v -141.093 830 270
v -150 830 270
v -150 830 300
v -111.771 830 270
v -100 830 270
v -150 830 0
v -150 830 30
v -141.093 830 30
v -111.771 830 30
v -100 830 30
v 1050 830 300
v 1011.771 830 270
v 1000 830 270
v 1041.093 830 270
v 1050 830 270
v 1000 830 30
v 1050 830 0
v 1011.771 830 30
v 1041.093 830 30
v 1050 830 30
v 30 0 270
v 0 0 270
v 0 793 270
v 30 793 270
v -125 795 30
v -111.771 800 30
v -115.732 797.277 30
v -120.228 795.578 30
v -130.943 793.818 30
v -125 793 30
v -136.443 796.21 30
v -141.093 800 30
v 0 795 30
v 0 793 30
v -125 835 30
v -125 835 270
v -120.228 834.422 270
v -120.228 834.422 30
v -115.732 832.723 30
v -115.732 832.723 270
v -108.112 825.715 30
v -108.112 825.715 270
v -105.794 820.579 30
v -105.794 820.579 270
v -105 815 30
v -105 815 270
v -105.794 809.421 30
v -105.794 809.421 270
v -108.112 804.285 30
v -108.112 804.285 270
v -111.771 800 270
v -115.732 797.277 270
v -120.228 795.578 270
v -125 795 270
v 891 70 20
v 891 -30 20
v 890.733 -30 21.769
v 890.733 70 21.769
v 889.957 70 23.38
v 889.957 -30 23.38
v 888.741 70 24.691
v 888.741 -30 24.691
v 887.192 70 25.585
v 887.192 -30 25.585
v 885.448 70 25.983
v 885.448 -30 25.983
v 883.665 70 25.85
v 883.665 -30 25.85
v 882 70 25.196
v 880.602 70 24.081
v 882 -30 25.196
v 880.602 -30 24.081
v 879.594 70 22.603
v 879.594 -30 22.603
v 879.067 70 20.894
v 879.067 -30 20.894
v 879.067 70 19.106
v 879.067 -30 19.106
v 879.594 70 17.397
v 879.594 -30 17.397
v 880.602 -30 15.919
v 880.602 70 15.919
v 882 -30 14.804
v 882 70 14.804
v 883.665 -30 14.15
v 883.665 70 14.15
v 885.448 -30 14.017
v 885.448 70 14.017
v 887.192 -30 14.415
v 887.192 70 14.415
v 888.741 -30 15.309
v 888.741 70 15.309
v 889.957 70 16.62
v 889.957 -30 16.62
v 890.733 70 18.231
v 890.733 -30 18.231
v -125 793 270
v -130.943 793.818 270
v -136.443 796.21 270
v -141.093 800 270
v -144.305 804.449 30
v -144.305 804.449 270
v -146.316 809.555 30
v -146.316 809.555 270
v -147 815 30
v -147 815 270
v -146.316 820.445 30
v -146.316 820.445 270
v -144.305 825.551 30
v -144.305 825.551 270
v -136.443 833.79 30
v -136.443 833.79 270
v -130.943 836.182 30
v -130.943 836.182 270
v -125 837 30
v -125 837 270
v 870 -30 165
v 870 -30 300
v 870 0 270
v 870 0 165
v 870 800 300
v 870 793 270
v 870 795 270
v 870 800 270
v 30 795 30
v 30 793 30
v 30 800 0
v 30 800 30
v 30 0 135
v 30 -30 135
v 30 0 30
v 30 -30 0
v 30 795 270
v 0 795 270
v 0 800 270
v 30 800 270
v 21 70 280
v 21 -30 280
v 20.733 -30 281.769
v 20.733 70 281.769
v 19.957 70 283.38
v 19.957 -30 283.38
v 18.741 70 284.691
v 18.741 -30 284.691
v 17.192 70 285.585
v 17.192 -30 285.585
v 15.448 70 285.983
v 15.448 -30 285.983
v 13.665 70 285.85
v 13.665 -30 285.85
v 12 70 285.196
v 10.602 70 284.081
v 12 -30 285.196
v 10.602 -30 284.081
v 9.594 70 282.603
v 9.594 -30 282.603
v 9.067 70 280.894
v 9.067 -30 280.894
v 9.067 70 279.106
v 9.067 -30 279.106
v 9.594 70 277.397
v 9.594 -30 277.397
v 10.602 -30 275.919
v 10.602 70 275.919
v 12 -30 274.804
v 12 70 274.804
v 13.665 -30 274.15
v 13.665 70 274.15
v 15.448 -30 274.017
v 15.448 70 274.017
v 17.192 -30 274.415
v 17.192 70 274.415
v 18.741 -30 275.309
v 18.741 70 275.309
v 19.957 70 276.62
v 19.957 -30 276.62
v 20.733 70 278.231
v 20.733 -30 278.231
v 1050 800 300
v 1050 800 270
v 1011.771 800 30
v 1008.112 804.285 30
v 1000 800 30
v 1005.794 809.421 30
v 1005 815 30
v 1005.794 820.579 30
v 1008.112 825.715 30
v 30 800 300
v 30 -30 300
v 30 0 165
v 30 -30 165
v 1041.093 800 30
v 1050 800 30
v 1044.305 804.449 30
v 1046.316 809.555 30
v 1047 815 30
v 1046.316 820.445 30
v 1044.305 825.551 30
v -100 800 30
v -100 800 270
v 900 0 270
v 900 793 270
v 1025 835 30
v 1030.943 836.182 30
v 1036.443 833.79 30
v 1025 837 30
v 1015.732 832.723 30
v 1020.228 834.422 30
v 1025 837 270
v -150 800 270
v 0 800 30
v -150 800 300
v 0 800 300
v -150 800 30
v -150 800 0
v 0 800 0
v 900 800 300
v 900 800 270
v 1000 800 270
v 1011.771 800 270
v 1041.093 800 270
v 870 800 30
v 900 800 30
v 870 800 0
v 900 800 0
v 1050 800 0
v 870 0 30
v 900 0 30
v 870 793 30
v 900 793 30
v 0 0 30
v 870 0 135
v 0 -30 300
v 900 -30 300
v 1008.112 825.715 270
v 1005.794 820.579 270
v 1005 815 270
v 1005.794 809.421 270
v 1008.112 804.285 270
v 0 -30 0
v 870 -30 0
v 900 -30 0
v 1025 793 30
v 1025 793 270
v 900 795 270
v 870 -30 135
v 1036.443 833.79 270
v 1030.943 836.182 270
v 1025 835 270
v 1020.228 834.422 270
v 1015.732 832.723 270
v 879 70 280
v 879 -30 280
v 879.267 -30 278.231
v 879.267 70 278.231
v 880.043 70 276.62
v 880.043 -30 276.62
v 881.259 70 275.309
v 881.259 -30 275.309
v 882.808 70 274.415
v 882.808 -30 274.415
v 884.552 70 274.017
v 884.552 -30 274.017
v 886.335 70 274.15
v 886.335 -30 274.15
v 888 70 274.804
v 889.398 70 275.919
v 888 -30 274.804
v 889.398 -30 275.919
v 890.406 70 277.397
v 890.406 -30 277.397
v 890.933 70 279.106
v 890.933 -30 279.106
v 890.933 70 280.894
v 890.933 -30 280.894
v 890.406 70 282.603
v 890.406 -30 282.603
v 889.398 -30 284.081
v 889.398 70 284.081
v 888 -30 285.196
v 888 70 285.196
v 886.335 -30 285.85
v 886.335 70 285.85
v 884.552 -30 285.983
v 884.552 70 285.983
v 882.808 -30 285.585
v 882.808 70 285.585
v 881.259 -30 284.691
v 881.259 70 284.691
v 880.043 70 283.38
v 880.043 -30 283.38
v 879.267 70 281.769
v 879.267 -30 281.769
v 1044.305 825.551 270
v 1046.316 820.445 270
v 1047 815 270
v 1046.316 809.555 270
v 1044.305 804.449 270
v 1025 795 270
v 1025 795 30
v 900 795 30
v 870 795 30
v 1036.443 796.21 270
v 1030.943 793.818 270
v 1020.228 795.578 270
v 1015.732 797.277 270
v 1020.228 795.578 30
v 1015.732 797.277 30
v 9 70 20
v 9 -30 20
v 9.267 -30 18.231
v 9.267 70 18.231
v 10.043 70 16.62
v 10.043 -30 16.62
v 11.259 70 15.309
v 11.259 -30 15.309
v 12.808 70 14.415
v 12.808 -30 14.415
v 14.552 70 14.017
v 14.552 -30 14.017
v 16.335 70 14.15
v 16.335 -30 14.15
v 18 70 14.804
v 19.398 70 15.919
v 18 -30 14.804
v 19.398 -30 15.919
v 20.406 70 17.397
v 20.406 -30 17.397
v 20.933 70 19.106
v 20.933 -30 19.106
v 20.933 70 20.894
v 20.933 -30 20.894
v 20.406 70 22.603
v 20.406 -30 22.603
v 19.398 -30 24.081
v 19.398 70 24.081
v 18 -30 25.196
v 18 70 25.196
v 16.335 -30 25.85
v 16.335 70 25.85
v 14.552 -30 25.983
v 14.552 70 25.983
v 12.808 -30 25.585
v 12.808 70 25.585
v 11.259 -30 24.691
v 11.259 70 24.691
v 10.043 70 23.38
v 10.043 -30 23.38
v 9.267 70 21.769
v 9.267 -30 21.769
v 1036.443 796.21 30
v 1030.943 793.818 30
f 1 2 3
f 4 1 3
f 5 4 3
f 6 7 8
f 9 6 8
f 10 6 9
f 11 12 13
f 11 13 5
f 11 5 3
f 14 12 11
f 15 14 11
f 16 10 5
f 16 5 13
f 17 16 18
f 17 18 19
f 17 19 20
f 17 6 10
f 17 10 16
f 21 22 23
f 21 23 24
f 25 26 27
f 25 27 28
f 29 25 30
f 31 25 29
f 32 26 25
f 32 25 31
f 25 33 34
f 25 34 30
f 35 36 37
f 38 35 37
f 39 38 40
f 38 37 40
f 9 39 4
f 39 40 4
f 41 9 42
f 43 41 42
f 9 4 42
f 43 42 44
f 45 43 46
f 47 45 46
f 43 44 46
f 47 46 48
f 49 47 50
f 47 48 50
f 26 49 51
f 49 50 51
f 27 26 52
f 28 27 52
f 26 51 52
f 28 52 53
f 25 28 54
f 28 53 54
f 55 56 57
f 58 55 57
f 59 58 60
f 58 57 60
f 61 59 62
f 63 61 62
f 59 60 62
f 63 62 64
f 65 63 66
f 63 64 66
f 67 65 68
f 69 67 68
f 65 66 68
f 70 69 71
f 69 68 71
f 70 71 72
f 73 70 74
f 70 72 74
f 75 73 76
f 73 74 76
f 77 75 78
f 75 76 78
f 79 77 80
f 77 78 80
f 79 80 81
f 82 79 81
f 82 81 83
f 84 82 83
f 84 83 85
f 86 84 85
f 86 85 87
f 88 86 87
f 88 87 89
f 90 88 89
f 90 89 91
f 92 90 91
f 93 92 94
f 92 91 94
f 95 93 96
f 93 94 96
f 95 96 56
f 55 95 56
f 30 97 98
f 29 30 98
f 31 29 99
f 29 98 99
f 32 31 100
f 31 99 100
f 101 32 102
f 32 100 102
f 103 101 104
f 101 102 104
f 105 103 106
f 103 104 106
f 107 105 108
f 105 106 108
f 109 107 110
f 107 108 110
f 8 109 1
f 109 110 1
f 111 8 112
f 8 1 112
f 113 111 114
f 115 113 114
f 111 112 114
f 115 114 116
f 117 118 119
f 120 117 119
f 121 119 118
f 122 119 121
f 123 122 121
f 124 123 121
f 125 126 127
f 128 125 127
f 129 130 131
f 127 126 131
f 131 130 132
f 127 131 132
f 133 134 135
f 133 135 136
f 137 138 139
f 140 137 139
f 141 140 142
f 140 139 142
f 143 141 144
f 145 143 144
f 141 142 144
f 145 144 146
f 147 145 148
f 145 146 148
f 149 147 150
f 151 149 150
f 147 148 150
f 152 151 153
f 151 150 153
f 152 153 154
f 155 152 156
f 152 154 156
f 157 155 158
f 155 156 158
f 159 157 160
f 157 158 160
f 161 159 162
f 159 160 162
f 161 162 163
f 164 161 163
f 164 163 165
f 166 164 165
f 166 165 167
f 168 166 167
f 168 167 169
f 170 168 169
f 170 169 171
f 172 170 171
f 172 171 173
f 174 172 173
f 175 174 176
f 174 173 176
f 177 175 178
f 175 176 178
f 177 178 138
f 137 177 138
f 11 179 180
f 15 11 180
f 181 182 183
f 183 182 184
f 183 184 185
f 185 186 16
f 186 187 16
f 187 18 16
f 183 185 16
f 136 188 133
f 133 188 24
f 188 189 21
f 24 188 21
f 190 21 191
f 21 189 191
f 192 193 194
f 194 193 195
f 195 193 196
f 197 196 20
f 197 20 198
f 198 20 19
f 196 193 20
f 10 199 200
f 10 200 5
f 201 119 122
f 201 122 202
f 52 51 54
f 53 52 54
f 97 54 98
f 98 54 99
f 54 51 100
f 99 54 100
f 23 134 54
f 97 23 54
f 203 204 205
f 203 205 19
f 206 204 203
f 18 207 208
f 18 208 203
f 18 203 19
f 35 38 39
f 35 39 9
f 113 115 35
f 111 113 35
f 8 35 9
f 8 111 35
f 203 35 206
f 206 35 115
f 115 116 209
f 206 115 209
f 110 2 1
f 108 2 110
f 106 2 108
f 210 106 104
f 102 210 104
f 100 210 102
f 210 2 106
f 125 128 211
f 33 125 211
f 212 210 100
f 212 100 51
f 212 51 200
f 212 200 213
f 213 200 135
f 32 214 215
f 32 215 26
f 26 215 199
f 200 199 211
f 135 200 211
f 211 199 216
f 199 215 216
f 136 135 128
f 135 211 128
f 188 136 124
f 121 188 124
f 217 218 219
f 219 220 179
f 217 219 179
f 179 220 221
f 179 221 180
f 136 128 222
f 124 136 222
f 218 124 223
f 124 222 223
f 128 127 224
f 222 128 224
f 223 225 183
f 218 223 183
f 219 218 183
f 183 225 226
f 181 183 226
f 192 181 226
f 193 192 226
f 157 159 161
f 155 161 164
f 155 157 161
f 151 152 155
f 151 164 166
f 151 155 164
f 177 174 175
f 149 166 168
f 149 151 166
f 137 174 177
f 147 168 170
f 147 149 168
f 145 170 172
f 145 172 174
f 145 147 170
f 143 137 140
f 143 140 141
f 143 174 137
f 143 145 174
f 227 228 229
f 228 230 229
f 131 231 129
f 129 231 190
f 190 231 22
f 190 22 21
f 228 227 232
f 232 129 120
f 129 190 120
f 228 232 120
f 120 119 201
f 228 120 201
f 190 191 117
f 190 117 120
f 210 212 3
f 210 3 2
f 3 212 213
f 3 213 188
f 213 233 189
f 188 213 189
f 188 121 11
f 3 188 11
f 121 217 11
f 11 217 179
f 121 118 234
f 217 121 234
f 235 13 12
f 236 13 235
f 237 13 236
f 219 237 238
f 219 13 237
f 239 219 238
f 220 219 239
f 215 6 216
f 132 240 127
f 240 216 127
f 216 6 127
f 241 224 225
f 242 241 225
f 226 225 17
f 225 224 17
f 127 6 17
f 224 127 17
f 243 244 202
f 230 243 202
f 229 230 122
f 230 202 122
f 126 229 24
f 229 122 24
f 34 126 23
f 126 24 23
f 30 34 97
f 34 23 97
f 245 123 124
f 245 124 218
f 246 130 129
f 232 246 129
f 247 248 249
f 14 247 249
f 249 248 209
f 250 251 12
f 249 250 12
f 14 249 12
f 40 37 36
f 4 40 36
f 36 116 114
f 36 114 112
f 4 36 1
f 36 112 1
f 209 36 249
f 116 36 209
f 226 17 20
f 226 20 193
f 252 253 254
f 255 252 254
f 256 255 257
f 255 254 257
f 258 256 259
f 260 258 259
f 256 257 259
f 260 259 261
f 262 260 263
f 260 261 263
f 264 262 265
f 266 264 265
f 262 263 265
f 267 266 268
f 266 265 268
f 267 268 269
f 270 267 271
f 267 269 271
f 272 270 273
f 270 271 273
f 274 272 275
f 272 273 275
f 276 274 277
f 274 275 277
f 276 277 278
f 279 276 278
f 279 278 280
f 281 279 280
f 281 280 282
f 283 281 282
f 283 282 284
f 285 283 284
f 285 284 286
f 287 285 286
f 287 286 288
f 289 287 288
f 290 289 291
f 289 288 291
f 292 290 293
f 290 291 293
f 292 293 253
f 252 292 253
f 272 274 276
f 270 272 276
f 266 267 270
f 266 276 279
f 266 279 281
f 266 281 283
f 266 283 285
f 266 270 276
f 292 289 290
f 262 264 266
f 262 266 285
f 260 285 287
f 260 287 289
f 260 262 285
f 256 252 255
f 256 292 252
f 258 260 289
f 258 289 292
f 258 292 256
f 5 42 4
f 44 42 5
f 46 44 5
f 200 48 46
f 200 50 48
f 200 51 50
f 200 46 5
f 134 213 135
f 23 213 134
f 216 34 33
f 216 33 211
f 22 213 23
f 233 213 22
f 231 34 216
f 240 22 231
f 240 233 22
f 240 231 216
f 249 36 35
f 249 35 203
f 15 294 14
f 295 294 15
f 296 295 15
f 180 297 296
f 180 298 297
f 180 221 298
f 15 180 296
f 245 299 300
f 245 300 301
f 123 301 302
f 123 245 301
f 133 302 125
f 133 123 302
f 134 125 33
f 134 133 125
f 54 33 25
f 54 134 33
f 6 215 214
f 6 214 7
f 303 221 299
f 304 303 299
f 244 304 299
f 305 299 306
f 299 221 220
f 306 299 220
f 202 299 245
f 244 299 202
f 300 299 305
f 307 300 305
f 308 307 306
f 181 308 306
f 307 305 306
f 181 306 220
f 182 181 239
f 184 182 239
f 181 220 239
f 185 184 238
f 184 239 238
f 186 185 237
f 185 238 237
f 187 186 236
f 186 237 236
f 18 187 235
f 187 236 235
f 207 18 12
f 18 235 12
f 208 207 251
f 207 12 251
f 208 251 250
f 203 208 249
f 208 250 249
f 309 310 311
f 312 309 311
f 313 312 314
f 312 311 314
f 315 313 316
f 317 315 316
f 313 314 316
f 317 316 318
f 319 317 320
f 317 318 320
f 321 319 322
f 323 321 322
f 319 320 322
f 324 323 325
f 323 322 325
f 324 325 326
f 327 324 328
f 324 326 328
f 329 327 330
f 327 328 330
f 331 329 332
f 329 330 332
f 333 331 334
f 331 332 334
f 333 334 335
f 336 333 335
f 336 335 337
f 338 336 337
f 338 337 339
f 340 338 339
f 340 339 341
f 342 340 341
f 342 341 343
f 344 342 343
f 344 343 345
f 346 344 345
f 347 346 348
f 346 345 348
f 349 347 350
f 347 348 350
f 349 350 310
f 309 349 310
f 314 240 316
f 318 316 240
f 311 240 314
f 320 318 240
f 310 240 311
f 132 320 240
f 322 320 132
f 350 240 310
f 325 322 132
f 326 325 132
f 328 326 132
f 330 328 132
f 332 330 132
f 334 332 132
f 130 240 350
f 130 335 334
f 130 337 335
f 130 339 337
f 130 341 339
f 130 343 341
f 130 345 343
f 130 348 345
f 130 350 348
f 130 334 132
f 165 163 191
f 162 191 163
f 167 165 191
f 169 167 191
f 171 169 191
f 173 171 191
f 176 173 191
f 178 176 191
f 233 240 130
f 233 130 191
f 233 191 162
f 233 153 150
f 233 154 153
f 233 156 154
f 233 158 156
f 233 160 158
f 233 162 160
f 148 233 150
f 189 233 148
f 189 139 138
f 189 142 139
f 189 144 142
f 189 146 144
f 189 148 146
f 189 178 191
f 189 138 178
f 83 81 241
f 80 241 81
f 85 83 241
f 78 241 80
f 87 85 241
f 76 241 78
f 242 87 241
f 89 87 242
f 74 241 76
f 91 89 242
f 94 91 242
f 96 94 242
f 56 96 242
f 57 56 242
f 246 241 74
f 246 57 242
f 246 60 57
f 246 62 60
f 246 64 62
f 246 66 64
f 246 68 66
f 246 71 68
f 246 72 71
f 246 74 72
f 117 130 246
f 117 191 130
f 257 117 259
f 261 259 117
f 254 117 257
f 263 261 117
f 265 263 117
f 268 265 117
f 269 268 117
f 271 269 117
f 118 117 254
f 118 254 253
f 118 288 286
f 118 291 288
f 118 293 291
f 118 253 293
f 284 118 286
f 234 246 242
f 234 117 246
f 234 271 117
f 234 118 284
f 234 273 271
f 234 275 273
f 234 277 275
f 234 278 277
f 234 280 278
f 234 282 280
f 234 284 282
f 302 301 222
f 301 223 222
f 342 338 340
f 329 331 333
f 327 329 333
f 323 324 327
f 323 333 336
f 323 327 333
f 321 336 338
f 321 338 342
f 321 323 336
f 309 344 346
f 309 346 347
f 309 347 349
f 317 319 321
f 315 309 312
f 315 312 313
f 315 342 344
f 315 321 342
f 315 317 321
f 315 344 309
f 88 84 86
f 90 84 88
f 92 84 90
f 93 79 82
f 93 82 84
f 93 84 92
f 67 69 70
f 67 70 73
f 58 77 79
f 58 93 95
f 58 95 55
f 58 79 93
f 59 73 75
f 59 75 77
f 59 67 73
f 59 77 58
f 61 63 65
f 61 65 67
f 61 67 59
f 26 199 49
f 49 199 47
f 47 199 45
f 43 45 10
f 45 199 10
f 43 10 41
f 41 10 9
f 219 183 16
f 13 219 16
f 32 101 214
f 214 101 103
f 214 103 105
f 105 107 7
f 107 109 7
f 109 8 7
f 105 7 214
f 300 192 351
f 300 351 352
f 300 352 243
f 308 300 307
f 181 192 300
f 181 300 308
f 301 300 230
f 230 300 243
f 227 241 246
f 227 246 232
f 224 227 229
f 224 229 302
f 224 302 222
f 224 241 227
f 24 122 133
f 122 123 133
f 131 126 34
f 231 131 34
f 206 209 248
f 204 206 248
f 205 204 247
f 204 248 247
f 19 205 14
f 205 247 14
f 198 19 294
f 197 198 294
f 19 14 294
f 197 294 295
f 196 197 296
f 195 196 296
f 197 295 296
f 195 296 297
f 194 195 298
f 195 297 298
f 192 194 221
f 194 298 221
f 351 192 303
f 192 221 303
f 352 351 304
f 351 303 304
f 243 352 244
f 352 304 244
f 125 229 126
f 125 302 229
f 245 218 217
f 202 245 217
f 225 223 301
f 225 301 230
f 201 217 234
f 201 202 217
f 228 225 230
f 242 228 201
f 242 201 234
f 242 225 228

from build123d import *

# Parameters (mm, degrees)
BOSS_EXTRUDE1_DEPTH  = 30
SKETCH2_W            = 30
SKETCH2_H            = 300
BOSS_EXTRUDE2_DEPTH  = 30
SKETCH3_W            = 30
SKETCH3_H            = 30
BOSS_EXTRUDE3_DEPTH  = 800
SKETCH4_W            = 1200
SKETCH4_H            = 30
BOSS_EXTRUDE4_DEPTH  = 30
BOSS_EXTRUDE5_REACH  = 1367.394
SKETCH5_W            = 1100
SKETCH5_H            = 30
BOSS_EXTRUDE6_REACH  = 1350.814
SKETCH6_W            = 30
SKETCH6_H            = 30
SKETCH7_R            = 20
BOSS_EXTRUDE9_DEPTH  = 240
BOSS_EXTRUDE10_START = -240
BOSS_EXTRUDE10_DEPTH = 240
SKETCH9_R            = 6
CUT_EXTRUDE1_DEPTH   = 100


with BuildPart() as part:
    # Sketch1 → Boss-Extrude1 (new body)
    with BuildSketch(Plane.XY):
        Polygon((0, 0), (0, 800), (-150, 800), (-150, 830), (1050, 830), (1050, 800), (900, 800), (900, 0), (870, 0), (870, 800), (30, 800), (30, 0), align=None)
    extrude(amount=BOSS_EXTRUDE1_DEPTH)

    # Sketch2 → Boss-Extrude2 (add)
    with BuildSketch(Plane.XZ):
        with Locations((15, 150)):
            Rectangle(SKETCH2_W, SKETCH2_H)
        with Locations((885, 150)):
            Rectangle(SKETCH2_W, SKETCH2_H)
    extrude(amount=BOSS_EXTRUDE2_DEPTH)

    # Sketch3 → Boss-Extrude3 (add)
    with BuildSketch(Plane(origin=(0, 0, 0), x_dir=(1, 0, 0), z_dir=(0, 1, 0))):
        with Locations((15, -285)):
            Rectangle(SKETCH3_W, SKETCH3_H)
        with Locations((885, -285)):
            Rectangle(SKETCH3_W, SKETCH3_H)
    extrude(amount=BOSS_EXTRUDE3_DEPTH)

    # Sketch4 → Boss-Extrude4 (add)
    with BuildSketch(Plane(origin=(0, 800, 0), x_dir=(1, 0, 0), z_dir=(0, 1, 0))):
        with Locations((450, -285)):
            Rectangle(SKETCH4_W, SKETCH4_H)
    extrude(amount=BOSS_EXTRUDE4_DEPTH)

    # Sketch5 → Boss-Extrude5 (add, up to next)
    with BuildSketch(Plane.XY.offset(30), mode=Mode.PRIVATE) as boss_extrude5_sk1:
        with Locations((450, 815)):
            Rectangle(SKETCH5_W, SKETCH5_H)
    boss_extrude5_tool1 = extrude(boss_extrude5_sk1.sketch, amount=BOSS_EXTRUDE5_REACH, mode=Mode.PRIVATE) - part.part
    add(boss_extrude5_tool1.solids().sort_by_distance((450, 815, 30))[0])

    # Sketch6 → Boss-Extrude6 (add, up to next)
    with BuildSketch(Plane(origin=(30, 0, 0), x_dir=(0, 0, -1), z_dir=(1, 0, 0)), mode=Mode.PRIVATE) as boss_extrude6_sk1:
        with Locations((-150, -15)):
            Rectangle(SKETCH6_W, SKETCH6_H)
    boss_extrude6_tool1 = extrude(boss_extrude6_sk1.sketch, amount=BOSS_EXTRUDE6_REACH, mode=Mode.PRIVATE) - part.part
    add(boss_extrude6_tool1.solids().sort_by_distance((30, -15, 150))[0])

    # Sketch7 → Boss-Extrude9 (add)
    with BuildSketch(Plane(origin=(0, 0, 270), x_dir=(-1, 0, 0), z_dir=(0, 0, -1))):
        with Locations(Location((-1025, 815, 0), (0, 0, 228.590377891))):
            Circle(SKETCH7_R)
        with Locations(Location((125, 815, 0), (0, 0, 228.590377891))):
            Circle(SKETCH7_R)
    extrude(amount=BOSS_EXTRUDE9_DEPTH)

    # Sketch8 → Boss-Extrude10 (add)
    with BuildSketch(Plane(origin=(0, 0, 30), x_dir=(-1, 0, 0), z_dir=(0, 0, -1)).offset(BOSS_EXTRUDE10_START)):
        with BuildLine():
            Line((125, 837), (-1025, 837))
            ThreePointArc((-1025, 837), (-1047, 815), (-1025, 793))
            Line((-1025, 793), (125, 793))
            ThreePointArc((125, 793), (147, 815), (125, 837))
        make_face()
        with BuildLine():
            Line((125, 835), (-1025, 835))
            ThreePointArc((-1025, 835), (-1045, 815), (-1025, 795))
            Line((-1025, 795), (125, 795))
            ThreePointArc((125, 795), (145, 815), (125, 835))
        make_face(mode=Mode.SUBTRACT)
    extrude(amount=BOSS_EXTRUDE10_DEPTH)

    # Sketch9 → Cut-Extrude1 (cut)
    with BuildSketch(Plane.XZ.offset(30)):
        with Locations((15, 280)):
            Circle(SKETCH9_R)
        with Locations(Location((15, 20, 0), (0, 0, 180))):
            Circle(SKETCH9_R)
        with Locations((885, 20)):
            Circle(SKETCH9_R)
        with Locations(Location((885, 280, 0), (0, 0, 180))):
            Circle(SKETCH9_R)
    extrude(amount=-CUT_EXTRUDE1_DEPTH, mode=Mode.SUBTRACT)


solid = part.part
